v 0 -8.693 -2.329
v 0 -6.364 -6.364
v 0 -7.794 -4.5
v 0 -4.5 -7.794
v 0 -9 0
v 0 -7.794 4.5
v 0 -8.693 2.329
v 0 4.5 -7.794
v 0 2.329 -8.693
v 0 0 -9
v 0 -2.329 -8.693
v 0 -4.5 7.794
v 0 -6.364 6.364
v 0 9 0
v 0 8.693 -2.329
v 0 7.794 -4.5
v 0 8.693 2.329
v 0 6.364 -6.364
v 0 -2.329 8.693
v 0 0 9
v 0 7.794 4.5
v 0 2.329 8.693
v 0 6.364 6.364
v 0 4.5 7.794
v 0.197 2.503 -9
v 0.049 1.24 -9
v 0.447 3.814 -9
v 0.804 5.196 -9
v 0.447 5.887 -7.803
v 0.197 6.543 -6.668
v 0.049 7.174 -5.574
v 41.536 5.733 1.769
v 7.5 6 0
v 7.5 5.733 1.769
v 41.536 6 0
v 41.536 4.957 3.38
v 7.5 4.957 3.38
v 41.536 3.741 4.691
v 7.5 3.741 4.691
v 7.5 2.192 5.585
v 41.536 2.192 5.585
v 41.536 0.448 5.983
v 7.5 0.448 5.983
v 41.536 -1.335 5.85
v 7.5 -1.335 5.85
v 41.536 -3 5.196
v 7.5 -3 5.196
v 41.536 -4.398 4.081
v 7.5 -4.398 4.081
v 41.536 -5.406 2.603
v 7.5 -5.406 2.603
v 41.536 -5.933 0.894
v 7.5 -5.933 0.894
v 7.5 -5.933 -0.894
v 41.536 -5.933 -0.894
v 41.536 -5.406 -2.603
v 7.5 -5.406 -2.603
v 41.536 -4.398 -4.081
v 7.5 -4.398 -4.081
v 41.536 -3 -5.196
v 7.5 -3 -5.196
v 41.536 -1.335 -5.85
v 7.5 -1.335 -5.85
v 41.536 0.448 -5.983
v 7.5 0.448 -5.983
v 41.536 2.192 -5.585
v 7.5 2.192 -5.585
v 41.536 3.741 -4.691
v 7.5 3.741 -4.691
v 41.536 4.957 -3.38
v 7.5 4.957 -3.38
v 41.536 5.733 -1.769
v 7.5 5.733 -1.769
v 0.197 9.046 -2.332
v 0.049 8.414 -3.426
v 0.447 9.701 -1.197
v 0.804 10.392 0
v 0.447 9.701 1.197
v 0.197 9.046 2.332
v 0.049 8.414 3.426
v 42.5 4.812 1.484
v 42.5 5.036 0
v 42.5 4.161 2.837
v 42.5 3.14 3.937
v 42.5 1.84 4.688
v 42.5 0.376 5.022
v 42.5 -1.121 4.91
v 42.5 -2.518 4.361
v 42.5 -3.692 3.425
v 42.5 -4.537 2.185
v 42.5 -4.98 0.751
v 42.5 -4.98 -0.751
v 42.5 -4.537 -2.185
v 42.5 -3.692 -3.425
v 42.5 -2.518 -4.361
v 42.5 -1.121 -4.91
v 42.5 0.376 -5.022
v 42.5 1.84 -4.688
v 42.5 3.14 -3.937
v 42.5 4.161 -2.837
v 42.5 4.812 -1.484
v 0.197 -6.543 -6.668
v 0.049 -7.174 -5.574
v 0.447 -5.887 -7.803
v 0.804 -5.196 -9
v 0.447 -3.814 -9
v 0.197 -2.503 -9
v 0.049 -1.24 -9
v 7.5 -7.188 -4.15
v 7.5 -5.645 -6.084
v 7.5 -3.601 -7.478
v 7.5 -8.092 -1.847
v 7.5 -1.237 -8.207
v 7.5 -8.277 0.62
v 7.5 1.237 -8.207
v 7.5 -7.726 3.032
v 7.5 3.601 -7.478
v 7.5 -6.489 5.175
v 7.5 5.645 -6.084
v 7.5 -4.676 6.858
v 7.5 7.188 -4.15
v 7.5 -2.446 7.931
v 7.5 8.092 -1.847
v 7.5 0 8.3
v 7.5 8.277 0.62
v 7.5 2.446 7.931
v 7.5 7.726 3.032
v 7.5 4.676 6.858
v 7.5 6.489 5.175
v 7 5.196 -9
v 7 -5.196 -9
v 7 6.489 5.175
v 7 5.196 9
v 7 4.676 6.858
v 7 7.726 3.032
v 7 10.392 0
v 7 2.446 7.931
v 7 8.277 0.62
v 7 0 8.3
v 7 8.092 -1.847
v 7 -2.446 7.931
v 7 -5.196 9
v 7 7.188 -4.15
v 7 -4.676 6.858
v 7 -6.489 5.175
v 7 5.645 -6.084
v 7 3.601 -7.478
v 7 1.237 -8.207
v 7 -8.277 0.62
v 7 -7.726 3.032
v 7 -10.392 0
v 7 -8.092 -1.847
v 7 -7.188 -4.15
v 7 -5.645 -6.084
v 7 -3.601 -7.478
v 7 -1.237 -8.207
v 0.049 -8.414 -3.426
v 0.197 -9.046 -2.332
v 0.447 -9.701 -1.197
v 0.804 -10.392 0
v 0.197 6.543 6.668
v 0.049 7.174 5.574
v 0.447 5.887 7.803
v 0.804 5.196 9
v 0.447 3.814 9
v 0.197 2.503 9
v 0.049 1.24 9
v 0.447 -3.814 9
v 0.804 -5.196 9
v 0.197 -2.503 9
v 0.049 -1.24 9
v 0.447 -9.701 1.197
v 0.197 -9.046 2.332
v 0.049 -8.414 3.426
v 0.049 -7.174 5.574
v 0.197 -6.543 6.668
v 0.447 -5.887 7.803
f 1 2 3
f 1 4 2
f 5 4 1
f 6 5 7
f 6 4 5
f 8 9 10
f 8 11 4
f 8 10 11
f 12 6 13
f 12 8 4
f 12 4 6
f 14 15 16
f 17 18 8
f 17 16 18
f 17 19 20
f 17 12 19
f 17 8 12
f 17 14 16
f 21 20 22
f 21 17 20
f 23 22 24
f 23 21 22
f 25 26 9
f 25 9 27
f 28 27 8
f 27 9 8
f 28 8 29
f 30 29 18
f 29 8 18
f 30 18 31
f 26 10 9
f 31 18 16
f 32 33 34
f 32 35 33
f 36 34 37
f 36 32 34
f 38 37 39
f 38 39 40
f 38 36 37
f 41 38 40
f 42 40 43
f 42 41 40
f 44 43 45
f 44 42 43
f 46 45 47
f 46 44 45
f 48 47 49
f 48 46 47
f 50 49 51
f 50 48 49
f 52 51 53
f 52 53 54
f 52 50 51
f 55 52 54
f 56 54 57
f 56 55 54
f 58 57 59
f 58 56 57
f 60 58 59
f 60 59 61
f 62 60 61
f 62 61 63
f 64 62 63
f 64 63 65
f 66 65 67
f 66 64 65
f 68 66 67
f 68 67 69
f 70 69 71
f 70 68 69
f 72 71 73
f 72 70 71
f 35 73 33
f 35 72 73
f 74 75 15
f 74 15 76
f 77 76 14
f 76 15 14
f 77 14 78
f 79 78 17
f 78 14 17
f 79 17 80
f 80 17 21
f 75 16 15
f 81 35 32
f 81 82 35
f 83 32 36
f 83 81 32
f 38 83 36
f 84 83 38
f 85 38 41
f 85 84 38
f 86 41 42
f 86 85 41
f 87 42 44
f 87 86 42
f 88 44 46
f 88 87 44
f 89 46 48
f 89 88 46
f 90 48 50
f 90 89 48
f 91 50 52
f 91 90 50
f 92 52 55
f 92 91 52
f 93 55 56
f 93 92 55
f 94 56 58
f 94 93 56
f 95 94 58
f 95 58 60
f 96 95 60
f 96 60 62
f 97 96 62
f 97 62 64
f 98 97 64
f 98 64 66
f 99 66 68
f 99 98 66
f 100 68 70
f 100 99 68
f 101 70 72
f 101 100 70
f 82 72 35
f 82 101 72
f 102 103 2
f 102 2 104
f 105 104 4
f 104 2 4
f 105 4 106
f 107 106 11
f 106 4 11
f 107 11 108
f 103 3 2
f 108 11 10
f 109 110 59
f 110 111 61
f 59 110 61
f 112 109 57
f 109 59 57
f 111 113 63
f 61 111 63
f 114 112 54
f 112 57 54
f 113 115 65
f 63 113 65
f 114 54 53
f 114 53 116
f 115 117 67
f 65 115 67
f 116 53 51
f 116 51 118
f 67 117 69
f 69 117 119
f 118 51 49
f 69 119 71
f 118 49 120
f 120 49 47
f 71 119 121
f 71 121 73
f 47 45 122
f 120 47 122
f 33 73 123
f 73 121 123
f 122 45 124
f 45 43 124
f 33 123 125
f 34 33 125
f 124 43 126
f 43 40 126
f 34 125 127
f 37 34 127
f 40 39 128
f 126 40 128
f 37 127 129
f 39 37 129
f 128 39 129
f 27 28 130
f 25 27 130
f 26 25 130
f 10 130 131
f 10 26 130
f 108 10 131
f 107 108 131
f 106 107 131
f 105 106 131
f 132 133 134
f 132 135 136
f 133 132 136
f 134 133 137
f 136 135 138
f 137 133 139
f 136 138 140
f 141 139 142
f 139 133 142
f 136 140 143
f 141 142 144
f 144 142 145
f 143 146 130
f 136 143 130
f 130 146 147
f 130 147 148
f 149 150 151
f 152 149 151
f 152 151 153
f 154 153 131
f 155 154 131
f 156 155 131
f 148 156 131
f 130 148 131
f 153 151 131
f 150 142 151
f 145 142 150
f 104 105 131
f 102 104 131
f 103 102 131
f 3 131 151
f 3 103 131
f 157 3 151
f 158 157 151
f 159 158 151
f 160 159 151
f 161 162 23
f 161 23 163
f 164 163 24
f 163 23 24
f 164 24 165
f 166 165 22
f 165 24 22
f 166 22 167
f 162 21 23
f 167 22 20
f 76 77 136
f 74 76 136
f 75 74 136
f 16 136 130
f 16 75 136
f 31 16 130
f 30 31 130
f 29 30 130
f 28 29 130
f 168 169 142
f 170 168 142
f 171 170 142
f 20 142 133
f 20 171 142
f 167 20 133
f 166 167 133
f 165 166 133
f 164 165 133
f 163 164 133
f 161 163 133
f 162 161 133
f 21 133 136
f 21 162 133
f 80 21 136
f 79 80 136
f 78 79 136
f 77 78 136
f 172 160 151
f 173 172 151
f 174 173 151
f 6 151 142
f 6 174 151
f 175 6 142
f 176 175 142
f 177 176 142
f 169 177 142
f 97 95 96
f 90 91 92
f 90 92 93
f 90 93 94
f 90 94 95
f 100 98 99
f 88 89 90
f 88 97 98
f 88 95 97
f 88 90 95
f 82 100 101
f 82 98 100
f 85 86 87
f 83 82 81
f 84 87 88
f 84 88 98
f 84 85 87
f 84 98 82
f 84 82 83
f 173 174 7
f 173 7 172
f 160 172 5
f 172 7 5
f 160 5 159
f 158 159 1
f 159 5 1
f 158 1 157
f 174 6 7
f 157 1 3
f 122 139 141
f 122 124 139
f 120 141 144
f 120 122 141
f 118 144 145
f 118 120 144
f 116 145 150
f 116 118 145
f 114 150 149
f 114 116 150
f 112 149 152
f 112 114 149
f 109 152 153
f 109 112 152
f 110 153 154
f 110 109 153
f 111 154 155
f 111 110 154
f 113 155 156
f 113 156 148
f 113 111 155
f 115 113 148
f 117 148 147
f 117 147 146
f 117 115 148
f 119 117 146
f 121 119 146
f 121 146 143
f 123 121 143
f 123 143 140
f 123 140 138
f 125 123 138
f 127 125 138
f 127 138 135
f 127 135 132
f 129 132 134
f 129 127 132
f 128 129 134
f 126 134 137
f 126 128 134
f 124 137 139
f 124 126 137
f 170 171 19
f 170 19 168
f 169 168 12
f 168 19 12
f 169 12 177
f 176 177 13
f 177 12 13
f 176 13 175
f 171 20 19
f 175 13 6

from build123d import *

# Parameters (mm, degrees)
BASEHEAD_DEPTH = 7.5
SKETCH4_W      = 0.5
SKETCH4_H      = 12.092304845


# Read off the part's stored shape, not the designer's step: HeadChamfer
with BuildPart() as part:
    # Sketch1 → BaseHead (new body)
    with BuildSketch(Plane(origin=(0, 0, 0), x_dir=(0, 0, -1), z_dir=(1, 0, 0))):
        Polygon((9, 5.196152423), (9, -5.196152423), (0, -10.392304845), (-9, -5.196152423), (-9, 5.196152423), (0, 10.392304845), align=None)
    extrude(amount=BASEHEAD_DEPTH)

    # HeadChamfer outline → HeadChamfer (revolve, cut)
    with BuildSketch(Plane.YX):
        Polygon((10.392304847, 0.803847578), (9, 0), (10.392304847, 0), align=None)
    revolve(axis=Axis((0, 0, 0), (1, 0, 0)), mode=Mode.SUBTRACT)

    # HeadChamfer 2 outline → HeadChamfer 2 (revolve)
    with BuildSketch(Plane.YX):
        Polygon((6, 7.5), (6, 41.536), (5.036, 42.5), (0, 42.5), (0, 7.5), align=None)
    revolve(axis=Axis((0, 0, 0), (1, 0, 0)))

    # Sketch4 → BearingFace (revolve, cut)
    with BuildSketch(Plane.XY, mode=Mode.PRIVATE) as bearingface_sk:
        with Locations((7.25, 14.346152423)):
            Rectangle(SKETCH4_W, SKETCH4_H)
    revolve(bearingface_sk.sketch.rotate(Axis((0, 0, 0), (1, 0, 0)), 90), axis=Axis((0, 0, 0), (1, 0, 0)), mode=Mode.SUBTRACT)


solid = part.part
